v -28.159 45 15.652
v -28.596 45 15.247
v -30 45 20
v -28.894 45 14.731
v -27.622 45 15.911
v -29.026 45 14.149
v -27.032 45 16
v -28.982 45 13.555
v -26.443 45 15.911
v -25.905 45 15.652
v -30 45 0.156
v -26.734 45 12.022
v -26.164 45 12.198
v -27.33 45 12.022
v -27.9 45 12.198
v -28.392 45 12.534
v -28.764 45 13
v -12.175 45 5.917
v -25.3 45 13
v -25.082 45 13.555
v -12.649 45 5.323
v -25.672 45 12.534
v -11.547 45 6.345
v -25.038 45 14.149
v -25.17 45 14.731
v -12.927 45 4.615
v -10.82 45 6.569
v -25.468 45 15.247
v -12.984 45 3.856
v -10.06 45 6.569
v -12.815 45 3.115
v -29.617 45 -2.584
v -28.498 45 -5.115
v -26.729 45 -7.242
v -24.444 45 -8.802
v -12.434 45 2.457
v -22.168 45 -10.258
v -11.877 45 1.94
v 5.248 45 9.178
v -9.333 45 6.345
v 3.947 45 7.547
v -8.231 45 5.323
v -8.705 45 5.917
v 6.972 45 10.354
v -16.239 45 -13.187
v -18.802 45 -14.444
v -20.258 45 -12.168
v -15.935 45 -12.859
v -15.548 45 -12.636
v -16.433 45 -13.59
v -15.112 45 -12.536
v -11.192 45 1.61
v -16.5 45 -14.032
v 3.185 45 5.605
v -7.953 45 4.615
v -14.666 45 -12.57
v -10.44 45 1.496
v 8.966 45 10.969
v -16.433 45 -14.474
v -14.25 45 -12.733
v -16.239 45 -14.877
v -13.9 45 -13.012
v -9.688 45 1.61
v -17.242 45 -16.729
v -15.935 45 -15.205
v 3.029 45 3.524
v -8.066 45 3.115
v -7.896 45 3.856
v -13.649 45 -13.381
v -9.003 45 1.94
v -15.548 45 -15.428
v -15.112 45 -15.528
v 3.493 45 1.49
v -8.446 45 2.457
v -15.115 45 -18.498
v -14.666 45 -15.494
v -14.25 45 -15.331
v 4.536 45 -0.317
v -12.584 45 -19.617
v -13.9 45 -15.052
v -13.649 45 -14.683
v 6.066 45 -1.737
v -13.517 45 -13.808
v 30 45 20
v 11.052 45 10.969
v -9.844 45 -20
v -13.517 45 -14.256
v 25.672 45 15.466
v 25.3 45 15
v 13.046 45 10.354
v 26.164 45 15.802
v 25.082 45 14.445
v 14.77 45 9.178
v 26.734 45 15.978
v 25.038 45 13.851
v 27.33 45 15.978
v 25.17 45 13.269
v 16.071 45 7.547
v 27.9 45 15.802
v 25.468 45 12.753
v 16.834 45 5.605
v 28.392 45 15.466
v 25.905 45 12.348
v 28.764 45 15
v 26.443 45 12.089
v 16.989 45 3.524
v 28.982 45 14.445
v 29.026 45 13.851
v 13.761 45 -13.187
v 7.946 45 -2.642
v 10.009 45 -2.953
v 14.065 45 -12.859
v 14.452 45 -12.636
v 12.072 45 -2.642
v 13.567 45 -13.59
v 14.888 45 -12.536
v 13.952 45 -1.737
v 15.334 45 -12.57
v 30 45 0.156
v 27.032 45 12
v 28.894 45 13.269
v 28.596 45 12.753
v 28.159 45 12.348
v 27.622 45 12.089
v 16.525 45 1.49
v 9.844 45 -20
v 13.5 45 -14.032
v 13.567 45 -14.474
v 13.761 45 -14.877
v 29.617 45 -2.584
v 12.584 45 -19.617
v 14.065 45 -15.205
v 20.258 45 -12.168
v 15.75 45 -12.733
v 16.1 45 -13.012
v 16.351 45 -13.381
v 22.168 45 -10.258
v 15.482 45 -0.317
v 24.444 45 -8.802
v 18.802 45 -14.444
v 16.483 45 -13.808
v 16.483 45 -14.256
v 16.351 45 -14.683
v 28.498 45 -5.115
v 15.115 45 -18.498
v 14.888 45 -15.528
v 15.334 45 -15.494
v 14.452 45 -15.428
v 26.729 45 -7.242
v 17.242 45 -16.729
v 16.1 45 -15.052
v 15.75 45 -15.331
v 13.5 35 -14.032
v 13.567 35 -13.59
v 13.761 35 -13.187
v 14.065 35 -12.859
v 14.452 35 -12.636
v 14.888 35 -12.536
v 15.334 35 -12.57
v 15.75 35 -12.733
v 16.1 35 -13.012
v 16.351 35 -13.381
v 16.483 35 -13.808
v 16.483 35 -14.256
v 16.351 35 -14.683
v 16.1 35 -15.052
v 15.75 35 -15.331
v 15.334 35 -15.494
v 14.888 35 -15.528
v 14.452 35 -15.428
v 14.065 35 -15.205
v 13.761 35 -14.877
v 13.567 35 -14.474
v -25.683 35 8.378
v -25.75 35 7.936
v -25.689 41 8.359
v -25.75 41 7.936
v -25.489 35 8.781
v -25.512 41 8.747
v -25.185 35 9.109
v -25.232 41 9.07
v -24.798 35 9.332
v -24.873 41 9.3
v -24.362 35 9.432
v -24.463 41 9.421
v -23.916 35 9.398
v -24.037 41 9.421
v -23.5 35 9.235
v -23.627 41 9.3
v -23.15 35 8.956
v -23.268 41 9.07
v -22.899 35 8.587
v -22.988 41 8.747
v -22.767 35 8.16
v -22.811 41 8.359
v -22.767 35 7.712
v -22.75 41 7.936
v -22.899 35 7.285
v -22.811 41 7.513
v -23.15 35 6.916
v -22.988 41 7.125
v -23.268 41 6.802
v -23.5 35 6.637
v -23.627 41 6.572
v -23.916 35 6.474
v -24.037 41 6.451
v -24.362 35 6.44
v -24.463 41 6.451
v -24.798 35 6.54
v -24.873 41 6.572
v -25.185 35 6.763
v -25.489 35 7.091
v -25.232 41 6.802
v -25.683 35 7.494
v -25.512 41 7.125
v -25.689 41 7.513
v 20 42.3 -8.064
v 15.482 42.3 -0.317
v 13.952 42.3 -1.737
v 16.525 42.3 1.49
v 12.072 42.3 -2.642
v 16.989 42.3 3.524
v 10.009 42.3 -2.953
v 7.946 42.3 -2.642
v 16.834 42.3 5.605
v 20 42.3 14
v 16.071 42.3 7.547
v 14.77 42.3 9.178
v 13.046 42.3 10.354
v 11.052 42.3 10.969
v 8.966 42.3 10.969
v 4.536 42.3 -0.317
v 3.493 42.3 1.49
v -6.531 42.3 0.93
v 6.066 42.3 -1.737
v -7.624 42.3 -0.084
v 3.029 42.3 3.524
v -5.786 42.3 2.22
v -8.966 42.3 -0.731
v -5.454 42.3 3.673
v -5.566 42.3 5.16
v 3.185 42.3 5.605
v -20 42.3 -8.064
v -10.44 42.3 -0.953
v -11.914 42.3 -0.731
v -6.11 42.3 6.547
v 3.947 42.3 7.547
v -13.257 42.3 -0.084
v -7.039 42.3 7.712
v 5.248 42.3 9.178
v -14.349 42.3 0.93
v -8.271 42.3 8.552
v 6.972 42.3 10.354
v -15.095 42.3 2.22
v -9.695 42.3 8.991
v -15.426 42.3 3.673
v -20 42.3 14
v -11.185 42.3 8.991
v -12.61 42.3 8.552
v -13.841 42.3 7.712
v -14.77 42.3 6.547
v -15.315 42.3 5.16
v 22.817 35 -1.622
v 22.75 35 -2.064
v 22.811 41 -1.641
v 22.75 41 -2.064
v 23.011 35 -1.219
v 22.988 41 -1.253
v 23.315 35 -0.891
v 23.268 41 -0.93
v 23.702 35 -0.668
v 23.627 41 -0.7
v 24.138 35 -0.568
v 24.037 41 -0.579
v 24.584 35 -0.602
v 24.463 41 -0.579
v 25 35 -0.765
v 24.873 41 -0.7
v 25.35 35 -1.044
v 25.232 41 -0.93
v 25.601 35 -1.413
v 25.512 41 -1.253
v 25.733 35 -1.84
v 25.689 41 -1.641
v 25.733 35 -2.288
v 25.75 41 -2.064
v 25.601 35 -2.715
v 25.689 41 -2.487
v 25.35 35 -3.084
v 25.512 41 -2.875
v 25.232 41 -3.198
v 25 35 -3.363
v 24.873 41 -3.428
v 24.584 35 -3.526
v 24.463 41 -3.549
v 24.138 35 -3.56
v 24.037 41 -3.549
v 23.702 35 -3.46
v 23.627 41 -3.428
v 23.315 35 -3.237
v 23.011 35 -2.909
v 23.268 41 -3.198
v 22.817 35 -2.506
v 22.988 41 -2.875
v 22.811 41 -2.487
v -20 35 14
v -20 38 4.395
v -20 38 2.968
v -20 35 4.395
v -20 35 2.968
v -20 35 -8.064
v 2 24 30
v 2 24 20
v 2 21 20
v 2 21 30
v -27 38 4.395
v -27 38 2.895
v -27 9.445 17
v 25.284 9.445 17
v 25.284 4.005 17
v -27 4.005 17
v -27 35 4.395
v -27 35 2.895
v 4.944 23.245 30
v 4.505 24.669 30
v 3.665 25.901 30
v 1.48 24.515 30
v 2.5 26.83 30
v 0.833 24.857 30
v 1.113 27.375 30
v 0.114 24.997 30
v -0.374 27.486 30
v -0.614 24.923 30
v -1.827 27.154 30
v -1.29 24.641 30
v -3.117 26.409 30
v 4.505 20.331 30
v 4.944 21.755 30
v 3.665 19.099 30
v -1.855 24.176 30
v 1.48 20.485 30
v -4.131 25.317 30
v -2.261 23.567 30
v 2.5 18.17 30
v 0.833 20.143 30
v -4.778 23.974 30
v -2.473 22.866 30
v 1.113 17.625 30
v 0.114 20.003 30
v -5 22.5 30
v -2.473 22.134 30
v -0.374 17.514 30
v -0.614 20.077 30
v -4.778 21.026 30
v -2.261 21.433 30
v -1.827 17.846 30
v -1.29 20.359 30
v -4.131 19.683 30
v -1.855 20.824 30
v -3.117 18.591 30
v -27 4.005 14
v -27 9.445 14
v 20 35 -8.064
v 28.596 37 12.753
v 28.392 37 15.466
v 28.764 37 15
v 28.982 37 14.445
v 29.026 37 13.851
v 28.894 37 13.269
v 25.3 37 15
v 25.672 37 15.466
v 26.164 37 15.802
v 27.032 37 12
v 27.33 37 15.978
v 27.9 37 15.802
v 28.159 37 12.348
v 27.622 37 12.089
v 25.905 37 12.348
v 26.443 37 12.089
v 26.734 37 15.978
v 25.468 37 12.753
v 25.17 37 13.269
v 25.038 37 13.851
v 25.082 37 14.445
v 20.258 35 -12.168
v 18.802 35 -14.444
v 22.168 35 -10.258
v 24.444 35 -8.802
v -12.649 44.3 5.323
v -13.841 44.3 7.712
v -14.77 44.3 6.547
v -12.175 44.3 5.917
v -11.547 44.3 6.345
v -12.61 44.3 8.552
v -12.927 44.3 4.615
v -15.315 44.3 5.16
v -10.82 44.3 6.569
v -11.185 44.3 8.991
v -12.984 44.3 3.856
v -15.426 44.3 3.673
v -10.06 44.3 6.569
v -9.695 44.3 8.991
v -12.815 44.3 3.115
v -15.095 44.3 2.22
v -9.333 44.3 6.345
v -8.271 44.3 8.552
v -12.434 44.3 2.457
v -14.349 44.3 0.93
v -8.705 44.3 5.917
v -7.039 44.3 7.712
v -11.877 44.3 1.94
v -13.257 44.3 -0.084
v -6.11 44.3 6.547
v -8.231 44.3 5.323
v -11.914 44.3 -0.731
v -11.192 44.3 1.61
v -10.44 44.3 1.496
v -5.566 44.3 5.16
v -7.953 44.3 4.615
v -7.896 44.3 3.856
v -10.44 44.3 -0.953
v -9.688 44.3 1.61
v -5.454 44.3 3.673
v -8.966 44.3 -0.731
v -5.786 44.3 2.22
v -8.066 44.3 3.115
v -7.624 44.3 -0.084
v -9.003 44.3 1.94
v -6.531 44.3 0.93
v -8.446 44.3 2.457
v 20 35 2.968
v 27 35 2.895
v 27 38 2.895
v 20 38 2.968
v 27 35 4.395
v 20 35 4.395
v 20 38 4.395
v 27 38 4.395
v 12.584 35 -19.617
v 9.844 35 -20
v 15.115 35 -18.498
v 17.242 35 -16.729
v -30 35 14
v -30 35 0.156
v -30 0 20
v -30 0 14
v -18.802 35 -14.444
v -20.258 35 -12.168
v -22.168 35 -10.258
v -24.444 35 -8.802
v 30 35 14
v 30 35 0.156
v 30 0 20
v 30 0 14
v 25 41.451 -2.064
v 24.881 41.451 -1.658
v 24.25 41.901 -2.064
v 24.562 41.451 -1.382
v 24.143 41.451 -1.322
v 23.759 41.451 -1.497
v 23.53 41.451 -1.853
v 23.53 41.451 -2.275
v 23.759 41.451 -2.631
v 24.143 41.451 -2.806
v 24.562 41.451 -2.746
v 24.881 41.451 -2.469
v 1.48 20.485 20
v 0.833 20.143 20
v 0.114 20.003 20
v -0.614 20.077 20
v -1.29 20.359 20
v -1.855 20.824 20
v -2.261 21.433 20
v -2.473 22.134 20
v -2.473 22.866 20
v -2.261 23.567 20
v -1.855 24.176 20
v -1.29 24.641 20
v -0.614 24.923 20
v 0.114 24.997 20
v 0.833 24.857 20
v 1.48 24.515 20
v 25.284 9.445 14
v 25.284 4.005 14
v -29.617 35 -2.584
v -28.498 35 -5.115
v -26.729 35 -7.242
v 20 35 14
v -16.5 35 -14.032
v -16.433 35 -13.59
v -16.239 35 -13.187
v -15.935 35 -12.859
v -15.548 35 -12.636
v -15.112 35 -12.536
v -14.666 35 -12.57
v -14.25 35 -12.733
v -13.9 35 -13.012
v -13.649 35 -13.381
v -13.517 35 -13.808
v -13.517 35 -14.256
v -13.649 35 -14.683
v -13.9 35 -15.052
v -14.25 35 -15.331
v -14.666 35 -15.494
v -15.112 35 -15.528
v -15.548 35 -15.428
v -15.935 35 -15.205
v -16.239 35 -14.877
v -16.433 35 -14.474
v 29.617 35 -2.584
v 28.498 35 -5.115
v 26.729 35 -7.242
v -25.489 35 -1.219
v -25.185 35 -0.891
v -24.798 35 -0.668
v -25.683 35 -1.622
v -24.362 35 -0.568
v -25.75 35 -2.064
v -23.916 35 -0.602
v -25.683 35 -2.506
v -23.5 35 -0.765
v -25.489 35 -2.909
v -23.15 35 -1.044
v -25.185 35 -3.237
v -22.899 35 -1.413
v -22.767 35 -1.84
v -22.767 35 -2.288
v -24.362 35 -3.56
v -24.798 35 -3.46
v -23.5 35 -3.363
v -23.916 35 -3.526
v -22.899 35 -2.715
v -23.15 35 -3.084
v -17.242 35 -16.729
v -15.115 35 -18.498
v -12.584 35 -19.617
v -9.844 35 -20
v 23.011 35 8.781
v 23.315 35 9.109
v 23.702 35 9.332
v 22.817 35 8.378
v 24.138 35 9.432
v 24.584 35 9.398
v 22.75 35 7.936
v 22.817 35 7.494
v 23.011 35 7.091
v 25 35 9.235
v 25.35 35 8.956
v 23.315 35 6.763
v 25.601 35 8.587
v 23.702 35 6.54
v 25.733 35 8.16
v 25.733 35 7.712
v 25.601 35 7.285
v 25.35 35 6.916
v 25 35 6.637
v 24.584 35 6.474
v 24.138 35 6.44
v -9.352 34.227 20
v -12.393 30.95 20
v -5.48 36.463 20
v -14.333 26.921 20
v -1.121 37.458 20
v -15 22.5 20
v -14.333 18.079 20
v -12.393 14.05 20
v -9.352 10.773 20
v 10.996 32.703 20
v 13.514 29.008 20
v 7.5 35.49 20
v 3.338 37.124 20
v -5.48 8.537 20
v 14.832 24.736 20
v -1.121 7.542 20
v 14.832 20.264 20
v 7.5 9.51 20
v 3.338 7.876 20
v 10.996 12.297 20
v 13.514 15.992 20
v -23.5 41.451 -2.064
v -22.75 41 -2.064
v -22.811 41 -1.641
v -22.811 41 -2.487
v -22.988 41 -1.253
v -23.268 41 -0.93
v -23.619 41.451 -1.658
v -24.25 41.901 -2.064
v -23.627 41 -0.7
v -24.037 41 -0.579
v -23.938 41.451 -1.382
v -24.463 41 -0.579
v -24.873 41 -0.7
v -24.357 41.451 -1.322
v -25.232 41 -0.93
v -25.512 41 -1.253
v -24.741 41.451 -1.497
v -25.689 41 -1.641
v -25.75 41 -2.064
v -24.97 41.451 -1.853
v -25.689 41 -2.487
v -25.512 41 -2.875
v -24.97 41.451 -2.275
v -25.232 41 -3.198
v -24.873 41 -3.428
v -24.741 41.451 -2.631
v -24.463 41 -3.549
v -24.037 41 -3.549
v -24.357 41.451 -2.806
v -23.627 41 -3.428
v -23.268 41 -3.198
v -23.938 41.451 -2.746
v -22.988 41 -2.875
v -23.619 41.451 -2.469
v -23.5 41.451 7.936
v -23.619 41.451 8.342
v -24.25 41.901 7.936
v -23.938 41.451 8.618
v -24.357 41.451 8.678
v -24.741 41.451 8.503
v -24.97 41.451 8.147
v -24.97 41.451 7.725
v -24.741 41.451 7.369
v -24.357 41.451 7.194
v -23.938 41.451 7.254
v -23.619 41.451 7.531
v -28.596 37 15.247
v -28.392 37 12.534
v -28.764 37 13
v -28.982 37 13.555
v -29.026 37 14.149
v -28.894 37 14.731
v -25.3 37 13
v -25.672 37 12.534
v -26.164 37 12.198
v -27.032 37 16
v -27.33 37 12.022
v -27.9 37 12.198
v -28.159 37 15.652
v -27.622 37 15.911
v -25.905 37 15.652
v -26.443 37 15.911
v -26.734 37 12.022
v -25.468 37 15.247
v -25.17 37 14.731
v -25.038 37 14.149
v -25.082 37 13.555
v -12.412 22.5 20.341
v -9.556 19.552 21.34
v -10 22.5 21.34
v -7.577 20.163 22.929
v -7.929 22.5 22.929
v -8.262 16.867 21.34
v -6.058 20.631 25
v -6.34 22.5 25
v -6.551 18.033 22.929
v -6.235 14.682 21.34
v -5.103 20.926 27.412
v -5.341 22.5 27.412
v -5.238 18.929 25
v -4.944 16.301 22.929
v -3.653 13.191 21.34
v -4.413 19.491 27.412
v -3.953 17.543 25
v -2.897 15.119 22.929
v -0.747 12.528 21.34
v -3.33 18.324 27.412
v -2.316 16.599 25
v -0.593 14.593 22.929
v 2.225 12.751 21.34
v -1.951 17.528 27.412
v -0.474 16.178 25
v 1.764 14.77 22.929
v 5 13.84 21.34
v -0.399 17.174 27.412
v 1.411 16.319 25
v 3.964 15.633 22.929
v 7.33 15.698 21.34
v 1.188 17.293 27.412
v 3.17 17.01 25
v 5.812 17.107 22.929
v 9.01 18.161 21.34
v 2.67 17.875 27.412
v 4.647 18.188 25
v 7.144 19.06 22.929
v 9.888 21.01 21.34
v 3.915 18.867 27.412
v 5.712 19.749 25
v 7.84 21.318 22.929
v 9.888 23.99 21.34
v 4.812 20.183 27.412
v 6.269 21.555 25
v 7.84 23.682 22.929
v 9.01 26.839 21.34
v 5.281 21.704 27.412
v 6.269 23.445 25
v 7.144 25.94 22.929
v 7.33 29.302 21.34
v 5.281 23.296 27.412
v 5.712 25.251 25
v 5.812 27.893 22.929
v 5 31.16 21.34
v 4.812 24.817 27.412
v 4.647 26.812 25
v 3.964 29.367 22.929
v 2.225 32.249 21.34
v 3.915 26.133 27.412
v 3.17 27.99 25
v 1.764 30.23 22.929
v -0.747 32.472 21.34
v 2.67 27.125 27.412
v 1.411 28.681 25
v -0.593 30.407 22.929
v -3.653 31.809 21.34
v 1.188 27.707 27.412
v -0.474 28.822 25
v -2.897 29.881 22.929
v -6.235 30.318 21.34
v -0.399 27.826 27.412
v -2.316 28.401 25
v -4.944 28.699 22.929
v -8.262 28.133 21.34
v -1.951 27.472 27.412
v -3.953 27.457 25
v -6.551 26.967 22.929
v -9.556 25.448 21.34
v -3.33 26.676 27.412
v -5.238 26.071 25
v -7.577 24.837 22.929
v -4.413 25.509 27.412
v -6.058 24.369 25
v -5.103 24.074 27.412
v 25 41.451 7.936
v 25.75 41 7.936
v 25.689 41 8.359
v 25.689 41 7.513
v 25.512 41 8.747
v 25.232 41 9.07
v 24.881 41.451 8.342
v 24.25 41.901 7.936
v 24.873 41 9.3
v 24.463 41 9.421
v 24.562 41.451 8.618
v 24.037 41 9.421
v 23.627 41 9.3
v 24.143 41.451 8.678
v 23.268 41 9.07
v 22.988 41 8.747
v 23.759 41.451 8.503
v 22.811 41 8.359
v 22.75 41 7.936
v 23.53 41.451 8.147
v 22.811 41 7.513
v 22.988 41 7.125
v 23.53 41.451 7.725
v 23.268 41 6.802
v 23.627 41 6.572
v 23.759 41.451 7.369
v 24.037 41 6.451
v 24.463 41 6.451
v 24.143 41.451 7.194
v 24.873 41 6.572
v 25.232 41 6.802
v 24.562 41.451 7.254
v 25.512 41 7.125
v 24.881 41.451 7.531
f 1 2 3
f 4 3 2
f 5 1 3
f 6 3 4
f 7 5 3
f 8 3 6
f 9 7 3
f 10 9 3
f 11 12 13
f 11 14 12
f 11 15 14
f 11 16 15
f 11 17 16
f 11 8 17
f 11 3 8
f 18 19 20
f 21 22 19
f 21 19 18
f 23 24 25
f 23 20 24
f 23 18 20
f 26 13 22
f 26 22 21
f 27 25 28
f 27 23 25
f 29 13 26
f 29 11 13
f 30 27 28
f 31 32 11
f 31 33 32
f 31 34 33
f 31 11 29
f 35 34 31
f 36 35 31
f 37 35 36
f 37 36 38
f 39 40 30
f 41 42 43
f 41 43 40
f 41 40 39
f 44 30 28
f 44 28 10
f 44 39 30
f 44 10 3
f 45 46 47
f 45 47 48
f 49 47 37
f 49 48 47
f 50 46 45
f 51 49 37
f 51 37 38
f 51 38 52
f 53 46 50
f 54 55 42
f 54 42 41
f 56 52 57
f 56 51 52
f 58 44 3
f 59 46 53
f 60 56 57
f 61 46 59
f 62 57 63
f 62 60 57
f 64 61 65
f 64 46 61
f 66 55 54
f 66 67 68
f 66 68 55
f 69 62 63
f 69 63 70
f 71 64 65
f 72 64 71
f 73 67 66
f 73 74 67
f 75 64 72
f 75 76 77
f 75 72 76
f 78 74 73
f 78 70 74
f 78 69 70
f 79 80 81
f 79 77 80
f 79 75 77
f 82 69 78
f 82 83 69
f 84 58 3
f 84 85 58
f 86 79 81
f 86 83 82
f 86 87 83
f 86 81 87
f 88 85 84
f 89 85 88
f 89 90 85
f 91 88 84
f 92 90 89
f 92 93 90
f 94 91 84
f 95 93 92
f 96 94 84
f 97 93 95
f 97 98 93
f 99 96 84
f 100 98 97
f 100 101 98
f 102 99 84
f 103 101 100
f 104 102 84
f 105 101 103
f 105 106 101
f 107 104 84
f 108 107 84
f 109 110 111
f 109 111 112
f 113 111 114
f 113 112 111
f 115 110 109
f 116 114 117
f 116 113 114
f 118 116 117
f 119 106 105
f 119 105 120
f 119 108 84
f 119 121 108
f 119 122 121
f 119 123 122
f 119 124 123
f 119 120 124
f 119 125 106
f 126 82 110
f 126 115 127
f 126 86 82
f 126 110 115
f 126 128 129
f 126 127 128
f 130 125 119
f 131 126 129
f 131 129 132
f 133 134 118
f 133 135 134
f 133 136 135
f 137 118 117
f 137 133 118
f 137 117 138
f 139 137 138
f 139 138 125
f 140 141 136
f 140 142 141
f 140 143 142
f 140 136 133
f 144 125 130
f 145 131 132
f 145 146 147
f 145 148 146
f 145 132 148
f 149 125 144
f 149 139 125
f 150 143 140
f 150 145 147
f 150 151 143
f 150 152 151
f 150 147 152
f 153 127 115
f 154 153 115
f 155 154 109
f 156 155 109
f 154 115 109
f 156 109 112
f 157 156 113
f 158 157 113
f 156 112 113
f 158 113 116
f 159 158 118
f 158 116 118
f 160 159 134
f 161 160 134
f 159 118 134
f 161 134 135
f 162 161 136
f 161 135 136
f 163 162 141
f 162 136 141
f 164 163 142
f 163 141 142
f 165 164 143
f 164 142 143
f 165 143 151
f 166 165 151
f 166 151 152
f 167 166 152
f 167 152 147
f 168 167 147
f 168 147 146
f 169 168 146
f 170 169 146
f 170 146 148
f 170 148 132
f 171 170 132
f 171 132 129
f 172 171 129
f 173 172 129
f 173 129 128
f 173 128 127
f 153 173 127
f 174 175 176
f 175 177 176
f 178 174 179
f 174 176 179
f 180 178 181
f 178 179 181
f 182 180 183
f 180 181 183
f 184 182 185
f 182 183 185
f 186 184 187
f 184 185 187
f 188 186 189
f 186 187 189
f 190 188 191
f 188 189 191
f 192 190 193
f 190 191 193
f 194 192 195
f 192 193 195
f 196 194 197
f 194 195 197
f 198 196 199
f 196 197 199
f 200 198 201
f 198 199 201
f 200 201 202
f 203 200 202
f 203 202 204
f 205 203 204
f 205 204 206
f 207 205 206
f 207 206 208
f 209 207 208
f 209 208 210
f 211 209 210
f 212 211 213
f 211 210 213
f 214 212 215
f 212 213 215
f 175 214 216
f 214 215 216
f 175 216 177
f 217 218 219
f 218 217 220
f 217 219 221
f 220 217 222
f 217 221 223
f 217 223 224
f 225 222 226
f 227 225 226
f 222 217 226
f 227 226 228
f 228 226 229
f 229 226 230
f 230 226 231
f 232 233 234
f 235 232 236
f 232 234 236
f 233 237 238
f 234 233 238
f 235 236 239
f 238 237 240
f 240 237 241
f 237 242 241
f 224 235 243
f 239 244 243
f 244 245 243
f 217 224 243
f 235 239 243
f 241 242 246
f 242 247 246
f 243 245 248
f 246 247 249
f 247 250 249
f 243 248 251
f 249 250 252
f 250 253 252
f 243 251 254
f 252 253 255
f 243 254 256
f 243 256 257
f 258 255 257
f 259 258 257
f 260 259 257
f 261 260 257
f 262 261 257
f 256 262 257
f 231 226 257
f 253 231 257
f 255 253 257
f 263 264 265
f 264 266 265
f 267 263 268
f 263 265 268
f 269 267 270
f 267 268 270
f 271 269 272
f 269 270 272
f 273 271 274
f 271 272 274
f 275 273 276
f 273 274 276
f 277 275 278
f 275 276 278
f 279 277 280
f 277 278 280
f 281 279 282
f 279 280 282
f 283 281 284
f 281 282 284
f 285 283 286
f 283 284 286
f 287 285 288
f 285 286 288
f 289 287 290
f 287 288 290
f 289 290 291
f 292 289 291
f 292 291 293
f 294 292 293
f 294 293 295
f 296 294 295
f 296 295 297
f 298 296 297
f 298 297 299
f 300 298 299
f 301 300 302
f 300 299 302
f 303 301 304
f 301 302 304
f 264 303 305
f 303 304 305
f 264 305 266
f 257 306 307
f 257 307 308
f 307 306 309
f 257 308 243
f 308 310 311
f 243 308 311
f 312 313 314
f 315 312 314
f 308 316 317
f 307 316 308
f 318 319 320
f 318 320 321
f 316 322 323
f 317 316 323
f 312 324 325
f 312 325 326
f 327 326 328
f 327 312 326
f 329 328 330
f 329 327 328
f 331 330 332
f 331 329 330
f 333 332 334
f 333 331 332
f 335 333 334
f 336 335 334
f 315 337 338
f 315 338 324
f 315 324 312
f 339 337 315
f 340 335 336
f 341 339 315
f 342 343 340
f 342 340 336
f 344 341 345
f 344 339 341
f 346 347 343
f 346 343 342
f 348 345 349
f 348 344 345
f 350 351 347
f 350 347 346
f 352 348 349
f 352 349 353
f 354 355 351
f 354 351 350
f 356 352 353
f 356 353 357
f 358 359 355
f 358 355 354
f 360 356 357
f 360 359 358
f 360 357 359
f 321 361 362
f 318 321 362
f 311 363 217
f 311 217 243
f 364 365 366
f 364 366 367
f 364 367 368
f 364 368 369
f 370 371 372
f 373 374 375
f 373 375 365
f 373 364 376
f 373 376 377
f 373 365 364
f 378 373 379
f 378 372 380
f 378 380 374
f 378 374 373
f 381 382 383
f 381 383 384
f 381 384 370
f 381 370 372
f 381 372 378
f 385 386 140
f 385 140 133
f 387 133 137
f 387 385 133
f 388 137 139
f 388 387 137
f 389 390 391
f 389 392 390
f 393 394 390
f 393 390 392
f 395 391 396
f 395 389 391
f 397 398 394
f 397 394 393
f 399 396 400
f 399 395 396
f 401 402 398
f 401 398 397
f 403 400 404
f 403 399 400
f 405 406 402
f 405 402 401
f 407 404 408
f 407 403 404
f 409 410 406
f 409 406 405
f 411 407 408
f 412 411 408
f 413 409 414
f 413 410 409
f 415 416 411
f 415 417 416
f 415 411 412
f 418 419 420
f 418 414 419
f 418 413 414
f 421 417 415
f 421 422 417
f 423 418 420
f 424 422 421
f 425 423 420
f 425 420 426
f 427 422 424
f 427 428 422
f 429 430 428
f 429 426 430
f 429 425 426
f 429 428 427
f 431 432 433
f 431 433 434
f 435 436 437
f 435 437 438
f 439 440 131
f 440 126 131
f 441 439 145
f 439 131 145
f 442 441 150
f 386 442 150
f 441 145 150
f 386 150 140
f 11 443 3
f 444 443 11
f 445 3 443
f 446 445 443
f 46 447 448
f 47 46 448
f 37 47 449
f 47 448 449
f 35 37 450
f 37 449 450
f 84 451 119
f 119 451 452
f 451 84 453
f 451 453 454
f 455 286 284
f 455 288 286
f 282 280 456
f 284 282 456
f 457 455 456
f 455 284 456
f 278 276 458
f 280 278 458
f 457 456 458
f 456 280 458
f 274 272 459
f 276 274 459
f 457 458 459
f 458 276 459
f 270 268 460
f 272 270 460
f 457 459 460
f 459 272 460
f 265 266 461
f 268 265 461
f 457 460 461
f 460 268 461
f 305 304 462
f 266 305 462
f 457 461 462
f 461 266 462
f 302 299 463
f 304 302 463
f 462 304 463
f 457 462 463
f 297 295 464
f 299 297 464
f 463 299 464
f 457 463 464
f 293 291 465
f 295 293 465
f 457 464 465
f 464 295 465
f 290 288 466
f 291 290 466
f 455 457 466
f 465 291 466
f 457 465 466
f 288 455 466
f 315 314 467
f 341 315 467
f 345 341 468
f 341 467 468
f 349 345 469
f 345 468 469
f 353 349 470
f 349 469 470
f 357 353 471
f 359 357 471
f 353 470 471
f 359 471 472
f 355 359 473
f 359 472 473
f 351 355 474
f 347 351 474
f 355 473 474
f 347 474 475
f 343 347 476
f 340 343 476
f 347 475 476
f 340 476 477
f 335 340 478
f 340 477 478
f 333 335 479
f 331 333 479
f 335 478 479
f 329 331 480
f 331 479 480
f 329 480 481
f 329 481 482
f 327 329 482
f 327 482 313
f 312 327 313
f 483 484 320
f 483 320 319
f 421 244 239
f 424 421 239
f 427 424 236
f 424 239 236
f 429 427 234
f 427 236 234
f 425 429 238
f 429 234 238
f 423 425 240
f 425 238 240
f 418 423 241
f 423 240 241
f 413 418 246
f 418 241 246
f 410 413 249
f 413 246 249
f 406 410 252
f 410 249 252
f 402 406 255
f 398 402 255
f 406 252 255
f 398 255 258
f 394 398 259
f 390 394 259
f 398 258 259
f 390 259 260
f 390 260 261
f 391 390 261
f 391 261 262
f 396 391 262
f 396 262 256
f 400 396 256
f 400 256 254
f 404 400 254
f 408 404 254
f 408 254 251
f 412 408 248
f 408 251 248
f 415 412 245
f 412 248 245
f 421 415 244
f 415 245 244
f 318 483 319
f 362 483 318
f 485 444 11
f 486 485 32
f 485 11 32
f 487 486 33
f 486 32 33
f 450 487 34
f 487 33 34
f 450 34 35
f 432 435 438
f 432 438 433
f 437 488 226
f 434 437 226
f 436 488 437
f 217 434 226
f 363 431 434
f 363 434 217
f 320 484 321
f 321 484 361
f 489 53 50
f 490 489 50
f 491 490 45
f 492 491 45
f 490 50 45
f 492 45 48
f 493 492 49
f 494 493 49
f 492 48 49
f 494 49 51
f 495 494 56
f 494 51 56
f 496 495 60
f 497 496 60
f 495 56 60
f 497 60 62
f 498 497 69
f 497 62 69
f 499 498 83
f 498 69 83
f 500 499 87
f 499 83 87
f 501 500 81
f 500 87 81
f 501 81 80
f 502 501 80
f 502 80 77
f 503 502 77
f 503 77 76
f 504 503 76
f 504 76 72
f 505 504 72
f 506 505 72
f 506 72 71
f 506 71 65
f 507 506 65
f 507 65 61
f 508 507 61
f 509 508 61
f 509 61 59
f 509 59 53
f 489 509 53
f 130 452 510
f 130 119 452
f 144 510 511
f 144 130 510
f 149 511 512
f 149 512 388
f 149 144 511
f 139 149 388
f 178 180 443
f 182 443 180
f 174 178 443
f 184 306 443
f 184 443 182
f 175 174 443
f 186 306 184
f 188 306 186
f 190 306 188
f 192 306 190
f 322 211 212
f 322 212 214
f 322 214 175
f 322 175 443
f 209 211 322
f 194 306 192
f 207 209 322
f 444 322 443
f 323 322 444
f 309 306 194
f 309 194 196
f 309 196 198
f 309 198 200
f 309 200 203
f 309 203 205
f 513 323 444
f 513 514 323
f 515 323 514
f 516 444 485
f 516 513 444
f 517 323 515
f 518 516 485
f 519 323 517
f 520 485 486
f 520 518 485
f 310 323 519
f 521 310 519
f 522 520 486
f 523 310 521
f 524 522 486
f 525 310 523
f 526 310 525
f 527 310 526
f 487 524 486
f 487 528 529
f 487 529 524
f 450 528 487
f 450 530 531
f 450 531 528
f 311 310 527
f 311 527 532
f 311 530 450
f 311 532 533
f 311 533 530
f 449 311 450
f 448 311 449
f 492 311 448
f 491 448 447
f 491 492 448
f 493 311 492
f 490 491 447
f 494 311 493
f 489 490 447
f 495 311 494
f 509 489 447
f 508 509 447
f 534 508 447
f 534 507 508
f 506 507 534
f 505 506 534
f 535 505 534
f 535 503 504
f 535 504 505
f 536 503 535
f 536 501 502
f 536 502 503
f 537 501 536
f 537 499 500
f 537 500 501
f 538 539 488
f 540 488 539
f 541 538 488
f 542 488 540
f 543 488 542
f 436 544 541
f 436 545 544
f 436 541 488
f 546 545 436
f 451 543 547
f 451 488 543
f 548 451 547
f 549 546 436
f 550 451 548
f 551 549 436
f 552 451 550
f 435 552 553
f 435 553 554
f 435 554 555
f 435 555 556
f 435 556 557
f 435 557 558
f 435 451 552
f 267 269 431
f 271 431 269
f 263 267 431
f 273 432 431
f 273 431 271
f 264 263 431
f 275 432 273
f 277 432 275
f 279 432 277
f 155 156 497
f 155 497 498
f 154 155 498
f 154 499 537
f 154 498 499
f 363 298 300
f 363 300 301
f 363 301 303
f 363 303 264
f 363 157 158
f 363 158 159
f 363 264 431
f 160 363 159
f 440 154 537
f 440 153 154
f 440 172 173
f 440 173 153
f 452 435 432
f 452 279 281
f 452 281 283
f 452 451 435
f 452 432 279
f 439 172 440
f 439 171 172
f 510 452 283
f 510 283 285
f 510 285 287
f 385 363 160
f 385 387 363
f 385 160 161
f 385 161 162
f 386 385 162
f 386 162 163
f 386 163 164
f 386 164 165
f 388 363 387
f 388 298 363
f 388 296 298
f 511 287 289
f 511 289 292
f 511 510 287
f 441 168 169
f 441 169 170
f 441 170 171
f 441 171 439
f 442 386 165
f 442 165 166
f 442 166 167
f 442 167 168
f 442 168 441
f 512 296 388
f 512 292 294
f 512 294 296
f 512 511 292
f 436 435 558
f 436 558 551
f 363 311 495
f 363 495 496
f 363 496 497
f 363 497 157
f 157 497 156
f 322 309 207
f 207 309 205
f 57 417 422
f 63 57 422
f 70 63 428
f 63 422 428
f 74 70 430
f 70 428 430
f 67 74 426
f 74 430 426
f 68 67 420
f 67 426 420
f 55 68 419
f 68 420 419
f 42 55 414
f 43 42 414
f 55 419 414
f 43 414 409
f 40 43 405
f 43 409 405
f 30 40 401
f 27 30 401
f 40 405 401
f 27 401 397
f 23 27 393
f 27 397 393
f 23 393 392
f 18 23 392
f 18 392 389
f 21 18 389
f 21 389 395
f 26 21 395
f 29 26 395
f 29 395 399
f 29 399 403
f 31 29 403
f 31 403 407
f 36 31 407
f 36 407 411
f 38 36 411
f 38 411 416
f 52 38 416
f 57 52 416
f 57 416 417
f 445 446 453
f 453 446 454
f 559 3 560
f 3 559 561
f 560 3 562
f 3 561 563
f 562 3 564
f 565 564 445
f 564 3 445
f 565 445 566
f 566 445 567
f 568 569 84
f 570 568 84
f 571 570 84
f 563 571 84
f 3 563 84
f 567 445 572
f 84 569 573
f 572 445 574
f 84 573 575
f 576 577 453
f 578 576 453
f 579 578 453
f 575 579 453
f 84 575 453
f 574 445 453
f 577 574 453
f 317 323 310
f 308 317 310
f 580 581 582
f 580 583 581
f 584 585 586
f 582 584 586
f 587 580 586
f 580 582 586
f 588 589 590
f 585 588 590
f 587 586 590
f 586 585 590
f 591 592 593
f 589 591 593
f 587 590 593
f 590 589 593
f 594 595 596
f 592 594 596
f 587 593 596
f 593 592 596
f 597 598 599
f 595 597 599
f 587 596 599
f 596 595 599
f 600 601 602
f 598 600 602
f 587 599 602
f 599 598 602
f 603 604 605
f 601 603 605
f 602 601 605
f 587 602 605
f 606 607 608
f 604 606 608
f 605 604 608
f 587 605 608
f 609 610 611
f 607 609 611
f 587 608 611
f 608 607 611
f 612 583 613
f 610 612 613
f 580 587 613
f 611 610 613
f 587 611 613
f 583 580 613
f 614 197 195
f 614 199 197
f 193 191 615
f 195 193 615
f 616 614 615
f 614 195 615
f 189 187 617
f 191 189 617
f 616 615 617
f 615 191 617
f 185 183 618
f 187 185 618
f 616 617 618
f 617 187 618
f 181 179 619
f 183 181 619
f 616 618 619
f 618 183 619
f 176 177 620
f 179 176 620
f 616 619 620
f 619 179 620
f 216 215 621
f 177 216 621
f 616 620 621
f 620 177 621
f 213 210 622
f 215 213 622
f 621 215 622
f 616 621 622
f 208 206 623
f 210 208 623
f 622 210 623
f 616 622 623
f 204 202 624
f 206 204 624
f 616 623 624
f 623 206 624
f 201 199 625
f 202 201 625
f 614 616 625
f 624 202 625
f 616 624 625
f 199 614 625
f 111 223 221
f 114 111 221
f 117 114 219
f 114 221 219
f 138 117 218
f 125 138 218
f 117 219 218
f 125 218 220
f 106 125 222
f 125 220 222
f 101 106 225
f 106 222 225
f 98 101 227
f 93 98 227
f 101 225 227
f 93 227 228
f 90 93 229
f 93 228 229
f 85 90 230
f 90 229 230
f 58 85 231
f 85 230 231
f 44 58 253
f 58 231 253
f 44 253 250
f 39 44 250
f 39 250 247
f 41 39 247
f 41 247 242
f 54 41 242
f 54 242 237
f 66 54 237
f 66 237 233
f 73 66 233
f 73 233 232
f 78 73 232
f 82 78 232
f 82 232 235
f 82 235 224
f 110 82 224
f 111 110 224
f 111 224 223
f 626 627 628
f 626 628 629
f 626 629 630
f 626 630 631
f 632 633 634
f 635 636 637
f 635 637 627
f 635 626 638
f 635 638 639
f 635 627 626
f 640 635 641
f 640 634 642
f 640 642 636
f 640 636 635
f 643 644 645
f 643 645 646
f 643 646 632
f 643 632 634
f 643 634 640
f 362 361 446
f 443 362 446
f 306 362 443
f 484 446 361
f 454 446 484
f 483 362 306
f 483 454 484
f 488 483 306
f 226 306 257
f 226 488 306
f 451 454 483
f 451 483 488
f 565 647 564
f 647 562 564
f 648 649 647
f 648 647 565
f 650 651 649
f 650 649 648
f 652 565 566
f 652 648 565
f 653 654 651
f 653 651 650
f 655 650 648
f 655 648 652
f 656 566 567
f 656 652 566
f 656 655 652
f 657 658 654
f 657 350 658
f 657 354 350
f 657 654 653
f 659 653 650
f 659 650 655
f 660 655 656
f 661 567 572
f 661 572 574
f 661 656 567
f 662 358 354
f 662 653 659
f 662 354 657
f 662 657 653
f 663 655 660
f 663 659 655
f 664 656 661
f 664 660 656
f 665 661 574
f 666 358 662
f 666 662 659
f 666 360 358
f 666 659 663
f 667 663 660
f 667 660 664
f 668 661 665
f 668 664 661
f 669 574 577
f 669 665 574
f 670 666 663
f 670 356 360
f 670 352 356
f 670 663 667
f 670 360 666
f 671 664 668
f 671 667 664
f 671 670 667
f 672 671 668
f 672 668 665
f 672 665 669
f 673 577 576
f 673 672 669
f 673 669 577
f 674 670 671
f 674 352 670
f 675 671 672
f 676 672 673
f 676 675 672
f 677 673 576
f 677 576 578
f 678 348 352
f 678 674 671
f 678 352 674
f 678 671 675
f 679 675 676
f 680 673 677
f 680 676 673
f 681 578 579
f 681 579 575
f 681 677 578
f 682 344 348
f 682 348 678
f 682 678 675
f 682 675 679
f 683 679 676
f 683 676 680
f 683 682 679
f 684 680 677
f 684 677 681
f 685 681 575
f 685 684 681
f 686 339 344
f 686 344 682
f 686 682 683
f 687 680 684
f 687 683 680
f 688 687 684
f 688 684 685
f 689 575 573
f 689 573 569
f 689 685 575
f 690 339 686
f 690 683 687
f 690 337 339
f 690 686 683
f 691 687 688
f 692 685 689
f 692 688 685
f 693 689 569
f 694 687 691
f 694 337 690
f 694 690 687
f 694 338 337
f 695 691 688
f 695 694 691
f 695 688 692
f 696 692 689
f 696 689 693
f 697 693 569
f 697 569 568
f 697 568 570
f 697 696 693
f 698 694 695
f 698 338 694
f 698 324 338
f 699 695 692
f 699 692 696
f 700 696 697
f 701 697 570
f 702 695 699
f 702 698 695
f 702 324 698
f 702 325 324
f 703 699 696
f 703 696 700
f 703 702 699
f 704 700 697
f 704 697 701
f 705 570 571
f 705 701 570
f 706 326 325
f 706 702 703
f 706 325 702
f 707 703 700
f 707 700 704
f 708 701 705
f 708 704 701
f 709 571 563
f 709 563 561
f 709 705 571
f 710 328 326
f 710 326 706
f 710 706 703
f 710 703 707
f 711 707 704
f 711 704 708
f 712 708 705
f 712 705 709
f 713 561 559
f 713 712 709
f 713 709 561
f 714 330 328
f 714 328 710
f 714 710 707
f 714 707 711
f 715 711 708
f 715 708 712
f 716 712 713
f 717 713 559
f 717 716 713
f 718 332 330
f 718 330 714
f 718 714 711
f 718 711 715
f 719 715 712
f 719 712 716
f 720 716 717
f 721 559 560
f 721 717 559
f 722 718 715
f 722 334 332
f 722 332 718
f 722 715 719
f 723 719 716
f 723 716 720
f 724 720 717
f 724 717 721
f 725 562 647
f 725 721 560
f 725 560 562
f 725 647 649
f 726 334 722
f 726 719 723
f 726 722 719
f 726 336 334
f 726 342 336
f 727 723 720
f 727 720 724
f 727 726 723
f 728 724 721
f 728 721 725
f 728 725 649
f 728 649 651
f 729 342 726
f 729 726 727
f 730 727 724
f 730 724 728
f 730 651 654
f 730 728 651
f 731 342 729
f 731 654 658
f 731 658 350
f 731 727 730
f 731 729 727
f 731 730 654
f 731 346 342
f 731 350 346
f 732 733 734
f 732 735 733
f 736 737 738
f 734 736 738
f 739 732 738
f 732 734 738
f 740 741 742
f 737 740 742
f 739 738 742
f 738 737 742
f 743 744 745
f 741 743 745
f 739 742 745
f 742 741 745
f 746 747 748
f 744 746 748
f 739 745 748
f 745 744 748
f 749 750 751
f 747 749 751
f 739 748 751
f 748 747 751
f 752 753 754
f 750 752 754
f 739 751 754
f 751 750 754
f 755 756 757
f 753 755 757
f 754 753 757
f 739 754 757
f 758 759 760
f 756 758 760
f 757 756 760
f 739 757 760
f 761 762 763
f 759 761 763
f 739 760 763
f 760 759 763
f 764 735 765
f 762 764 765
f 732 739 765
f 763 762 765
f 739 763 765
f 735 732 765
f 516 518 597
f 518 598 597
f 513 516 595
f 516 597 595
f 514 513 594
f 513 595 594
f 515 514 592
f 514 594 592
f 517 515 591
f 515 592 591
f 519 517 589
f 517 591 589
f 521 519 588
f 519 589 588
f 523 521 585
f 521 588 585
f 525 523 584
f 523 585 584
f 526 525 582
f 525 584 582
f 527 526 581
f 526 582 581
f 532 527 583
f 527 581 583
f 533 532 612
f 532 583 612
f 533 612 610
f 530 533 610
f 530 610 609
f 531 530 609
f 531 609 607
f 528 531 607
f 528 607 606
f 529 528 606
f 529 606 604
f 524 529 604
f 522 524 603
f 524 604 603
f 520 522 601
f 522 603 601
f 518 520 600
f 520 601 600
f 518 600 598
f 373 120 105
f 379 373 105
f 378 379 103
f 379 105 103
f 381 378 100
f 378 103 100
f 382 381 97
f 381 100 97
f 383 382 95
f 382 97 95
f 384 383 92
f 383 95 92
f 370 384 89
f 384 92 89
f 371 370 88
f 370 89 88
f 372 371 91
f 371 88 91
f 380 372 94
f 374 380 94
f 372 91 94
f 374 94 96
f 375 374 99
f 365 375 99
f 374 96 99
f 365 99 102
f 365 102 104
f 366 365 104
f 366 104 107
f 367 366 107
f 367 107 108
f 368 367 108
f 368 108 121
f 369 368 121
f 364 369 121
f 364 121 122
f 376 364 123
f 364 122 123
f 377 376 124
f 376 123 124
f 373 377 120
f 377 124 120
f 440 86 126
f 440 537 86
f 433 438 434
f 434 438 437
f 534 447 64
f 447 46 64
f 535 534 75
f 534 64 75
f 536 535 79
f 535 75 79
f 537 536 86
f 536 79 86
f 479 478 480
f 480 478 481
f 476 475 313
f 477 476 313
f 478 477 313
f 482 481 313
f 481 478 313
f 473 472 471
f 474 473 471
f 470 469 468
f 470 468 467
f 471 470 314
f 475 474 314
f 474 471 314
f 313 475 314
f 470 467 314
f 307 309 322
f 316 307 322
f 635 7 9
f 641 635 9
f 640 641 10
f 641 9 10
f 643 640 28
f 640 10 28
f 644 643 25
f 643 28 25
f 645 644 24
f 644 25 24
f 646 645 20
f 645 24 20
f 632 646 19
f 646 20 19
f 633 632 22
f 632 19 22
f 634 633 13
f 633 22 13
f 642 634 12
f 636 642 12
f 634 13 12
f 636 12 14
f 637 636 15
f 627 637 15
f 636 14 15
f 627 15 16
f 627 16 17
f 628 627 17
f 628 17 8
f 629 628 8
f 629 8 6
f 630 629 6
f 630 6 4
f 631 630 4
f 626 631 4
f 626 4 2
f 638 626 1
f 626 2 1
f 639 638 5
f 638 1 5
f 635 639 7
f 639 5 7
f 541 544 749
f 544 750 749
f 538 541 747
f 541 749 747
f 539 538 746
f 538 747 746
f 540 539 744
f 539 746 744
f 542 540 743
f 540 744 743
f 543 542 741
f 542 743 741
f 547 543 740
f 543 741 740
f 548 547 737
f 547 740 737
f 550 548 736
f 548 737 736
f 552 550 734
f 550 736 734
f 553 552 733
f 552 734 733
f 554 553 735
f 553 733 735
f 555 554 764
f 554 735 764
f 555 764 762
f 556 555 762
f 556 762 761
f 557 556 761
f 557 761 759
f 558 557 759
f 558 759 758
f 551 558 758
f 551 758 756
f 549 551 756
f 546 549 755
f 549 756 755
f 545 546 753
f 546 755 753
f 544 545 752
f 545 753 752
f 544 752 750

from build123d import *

# Parameters (mm, degrees)
SKETCH_4_W           = 60
SKETCH_4_H           = 40
EXTRUDE_2_DEPTH      = 45
SKETCH_5_W           = 34
SKETCH_5_H           = 35
CUT_EXTRUDE_2_DEPTH  = 78.620873481
F_3_0MM_1_D          = 3
F_3_0MM_1_DEPTH      = 6
F_3_0MM_1_TIP        = 0.901290929
CUT_EXTRUDE_3_DEPTH  = 7.3
SKETCH_9_R           = 7
CUT_EXTRUDE_4_DEPTH  = 8.3
SKETCH_10_R          = 2.550838559
CUT_EXTRUDE_5_DEPTH  = 8.3
SKETCH_11_R          = 5
CUT_EXTRUDE_6_DEPTH  = 2
CUT_EXTRUDE_7_DEPTH  = 3
SKETCH_14_W          = 52.283643435
SKETCH_14_H          = 5.439682323
CUT_EXTRUDE_8_DEPTH  = 3
SKETCH_15_R          = 5
EXTRUDE_3_DEPTH      = 10
FILLET_1_R           = 10
F_3_0MM_2_D          = 3
SKETCH_18_R          = 2
CUT_EXTRUDE_9_DEPTH  = 8
CUT_EXTRUDE_10_DEPTH = 10
FILLET_2_R           = 10


with BuildPart() as part:
    # 草图4 → 凸台-拉伸2 (new body)
    with BuildSketch(Plane(origin=(0, 0, 0), x_dir=(1, 0, 0), z_dir=(0, 1, 0))):
        Rectangle(SKETCH_4_W, SKETCH_4_H)
    extrude(amount=EXTRUDE_2_DEPTH)

    # 草图5 → 切除-拉伸2 (cut, through all)
    with BuildSketch(Plane(origin=(30, 0, 0), x_dir=(0, 0, -1), z_dir=(1, 0, 0))):
        with Locations((3, 17.5)):
            Rectangle(SKETCH_5_W, SKETCH_5_H)
    extrude(amount=-CUT_EXTRUDE_2_DEPTH, mode=Mode.SUBTRACT)

    # Ø3.0mm 暗销孔1
    with Locations(Plane.XZ.offset(-35)):
        with Locations((24.25, -2.063956798), (-24.25, 7.936043202), (-24.25, -2.063956798), (24.25, 7.936043202)):
            Hole(F_3_0MM_1_D / 2, depth=F_3_0MM_1_DEPTH)
            with Locations((0, 0, -(F_3_0MM_1_DEPTH + F_3_0MM_1_TIP / 2))):  # 118° drill point
                Cone(0, F_3_0MM_1_D / 2, F_3_0MM_1_TIP, mode=Mode.SUBTRACT)

    # 草图8 → 切除-拉伸3 (cut)
    with BuildSketch(Plane.XZ.offset(-35)):
        Polygon((-20, -2.063956798), (-20, 14), (20, 14), (20, -8.063956798), (-20, -8.063956798), align=None)
    extrude(amount=-CUT_EXTRUDE_3_DEPTH, mode=Mode.SUBTRACT)

    # 草图9 → 切除-拉伸4 (cut)
    with BuildSketch(Plane.XZ.offset(-42.3)):
        with Locations(Location((10.009015473, 4.047123648, 0), (0, 0, 270))):
            Circle(SKETCH_9_R)
    extrude(amount=-CUT_EXTRUDE_4_DEPTH, mode=Mode.SUBTRACT)

    # 草图10 → 切除-拉伸5 (cut)
    with BuildSketch(Plane.XZ.offset(-42.3)):
        with Locations(Location((-10.440145967, 4.047123648, 0), (0, 0, 270))):
            Circle(SKETCH_10_R)
    extrude(amount=-CUT_EXTRUDE_5_DEPTH, mode=Mode.SUBTRACT)

    # 草图11 → 切除-拉伸6 (cut)
    with BuildSketch(Plane.XZ.offset(-42.3)):
        with Locations(Location((-10.440145967, 4.047123648, 0), (0, 0, 270))):
            Circle(SKETCH_11_R)
    extrude(amount=-CUT_EXTRUDE_6_DEPTH, mode=Mode.SUBTRACT)

    # 草图13 → 切除-拉伸7 (cut)
    with BuildSketch(Plane.XZ.offset(-35)):
        Polygon((-20, 4.395263317), (-27, 4.395263317), (-27, 2.895263317), (-20, 2.968021601), align=None)
        Polygon((20, 2.968021601), (20, 4.395263317), (27, 4.395263317), (27, 2.895263317), align=None)
    extrude(amount=-CUT_EXTRUDE_7_DEPTH, mode=Mode.SUBTRACT)

    # 草图14 → 切除-拉伸8 (cut)
    with BuildSketch(Plane(origin=(0, 0, 14), x_dir=(-1, 0, 0), z_dir=(0, 0, -1))):
        with Locations((0.858178282, 6.724921265)):
            Rectangle(SKETCH_14_W, SKETCH_14_H)
    extrude(amount=-CUT_EXTRUDE_8_DEPTH, mode=Mode.SUBTRACT)

    # 草图15 → 凸台-拉伸3 (add)
    with BuildSketch(Plane.XY.offset(20)):
        with Locations(Location((0, 22.5, 0), (0, 0, 180))):
            Circle(SKETCH_15_R)
        with BuildLine():
            Line((2, 24), (2, 21))
            ThreePointArc((2, 21), (-2.5, 22.5), (2, 24))
        make_face(mode=Mode.SUBTRACT)
    extrude(amount=EXTRUDE_3_DEPTH)

    # 圆角1
    fillet_1_edges = [part.edges().sort_by_distance(p)[0] for p in [
        (5, 22.5, 20),
    ]]
    fillet(fillet_1_edges, radius=FILLET_1_R - 0.0001)  # a hair under: the kernel refuses the full size

    # Ø3.0mm 暗销孔2 (through all)
    with Locations(Plane.XZ.offset(-35)):
        with Locations((15, -14.031978399), (-15, -14.031978399)):
            Hole(F_3_0MM_2_D / 2)

    # 草图18 → 切除-拉伸9 (cut)
    with BuildSketch(Plane(origin=(0, 45, 0), x_dir=(1, 0, 0), z_dir=(0, 1, 0))):
        with Locations(Location((-27.03202133, -14, 0), (0, 0, 270))):
            Circle(SKETCH_18_R)
        with Locations(Location((27.03202133, -14, 0), (0, 0, 90))):
            Circle(SKETCH_18_R)
    extrude(amount=-CUT_EXTRUDE_9_DEPTH, mode=Mode.SUBTRACT)

    # 草图20 → 切除-拉伸10 (cut)
    with BuildSketch(Plane.XZ.offset(-35)):
        with BuildLine():
            Line((-30, -7.5), (-30, -20))
            Line((-30, -20), (-17.5, -20))
            ThreePointArc((-17.5, -20), (-21.161165235, -11.161165235), (-30, -7.5))
        make_face()
        with BuildLine():
            Line((30, -20), (17.5, -20))
            ThreePointArc((17.5, -20), (21.161165235, -11.161165235), (30, -7.5))
            Line((30, -7.5), (30, -20))
        make_face()
    extrude(amount=-CUT_EXTRUDE_10_DEPTH, mode=Mode.SUBTRACT)

    # 圆角2
    fillet_2_edges = [part.edges().sort_by_distance(p)[0] for p in [
        (-17.5, 40, -20),
        (-30, 40, -7.5),
        (30, 40, -7.5),
        (17.5, 40, -20),
    ]]
    fillet(fillet_2_edges, radius=FILLET_2_R)


solid = part.part
